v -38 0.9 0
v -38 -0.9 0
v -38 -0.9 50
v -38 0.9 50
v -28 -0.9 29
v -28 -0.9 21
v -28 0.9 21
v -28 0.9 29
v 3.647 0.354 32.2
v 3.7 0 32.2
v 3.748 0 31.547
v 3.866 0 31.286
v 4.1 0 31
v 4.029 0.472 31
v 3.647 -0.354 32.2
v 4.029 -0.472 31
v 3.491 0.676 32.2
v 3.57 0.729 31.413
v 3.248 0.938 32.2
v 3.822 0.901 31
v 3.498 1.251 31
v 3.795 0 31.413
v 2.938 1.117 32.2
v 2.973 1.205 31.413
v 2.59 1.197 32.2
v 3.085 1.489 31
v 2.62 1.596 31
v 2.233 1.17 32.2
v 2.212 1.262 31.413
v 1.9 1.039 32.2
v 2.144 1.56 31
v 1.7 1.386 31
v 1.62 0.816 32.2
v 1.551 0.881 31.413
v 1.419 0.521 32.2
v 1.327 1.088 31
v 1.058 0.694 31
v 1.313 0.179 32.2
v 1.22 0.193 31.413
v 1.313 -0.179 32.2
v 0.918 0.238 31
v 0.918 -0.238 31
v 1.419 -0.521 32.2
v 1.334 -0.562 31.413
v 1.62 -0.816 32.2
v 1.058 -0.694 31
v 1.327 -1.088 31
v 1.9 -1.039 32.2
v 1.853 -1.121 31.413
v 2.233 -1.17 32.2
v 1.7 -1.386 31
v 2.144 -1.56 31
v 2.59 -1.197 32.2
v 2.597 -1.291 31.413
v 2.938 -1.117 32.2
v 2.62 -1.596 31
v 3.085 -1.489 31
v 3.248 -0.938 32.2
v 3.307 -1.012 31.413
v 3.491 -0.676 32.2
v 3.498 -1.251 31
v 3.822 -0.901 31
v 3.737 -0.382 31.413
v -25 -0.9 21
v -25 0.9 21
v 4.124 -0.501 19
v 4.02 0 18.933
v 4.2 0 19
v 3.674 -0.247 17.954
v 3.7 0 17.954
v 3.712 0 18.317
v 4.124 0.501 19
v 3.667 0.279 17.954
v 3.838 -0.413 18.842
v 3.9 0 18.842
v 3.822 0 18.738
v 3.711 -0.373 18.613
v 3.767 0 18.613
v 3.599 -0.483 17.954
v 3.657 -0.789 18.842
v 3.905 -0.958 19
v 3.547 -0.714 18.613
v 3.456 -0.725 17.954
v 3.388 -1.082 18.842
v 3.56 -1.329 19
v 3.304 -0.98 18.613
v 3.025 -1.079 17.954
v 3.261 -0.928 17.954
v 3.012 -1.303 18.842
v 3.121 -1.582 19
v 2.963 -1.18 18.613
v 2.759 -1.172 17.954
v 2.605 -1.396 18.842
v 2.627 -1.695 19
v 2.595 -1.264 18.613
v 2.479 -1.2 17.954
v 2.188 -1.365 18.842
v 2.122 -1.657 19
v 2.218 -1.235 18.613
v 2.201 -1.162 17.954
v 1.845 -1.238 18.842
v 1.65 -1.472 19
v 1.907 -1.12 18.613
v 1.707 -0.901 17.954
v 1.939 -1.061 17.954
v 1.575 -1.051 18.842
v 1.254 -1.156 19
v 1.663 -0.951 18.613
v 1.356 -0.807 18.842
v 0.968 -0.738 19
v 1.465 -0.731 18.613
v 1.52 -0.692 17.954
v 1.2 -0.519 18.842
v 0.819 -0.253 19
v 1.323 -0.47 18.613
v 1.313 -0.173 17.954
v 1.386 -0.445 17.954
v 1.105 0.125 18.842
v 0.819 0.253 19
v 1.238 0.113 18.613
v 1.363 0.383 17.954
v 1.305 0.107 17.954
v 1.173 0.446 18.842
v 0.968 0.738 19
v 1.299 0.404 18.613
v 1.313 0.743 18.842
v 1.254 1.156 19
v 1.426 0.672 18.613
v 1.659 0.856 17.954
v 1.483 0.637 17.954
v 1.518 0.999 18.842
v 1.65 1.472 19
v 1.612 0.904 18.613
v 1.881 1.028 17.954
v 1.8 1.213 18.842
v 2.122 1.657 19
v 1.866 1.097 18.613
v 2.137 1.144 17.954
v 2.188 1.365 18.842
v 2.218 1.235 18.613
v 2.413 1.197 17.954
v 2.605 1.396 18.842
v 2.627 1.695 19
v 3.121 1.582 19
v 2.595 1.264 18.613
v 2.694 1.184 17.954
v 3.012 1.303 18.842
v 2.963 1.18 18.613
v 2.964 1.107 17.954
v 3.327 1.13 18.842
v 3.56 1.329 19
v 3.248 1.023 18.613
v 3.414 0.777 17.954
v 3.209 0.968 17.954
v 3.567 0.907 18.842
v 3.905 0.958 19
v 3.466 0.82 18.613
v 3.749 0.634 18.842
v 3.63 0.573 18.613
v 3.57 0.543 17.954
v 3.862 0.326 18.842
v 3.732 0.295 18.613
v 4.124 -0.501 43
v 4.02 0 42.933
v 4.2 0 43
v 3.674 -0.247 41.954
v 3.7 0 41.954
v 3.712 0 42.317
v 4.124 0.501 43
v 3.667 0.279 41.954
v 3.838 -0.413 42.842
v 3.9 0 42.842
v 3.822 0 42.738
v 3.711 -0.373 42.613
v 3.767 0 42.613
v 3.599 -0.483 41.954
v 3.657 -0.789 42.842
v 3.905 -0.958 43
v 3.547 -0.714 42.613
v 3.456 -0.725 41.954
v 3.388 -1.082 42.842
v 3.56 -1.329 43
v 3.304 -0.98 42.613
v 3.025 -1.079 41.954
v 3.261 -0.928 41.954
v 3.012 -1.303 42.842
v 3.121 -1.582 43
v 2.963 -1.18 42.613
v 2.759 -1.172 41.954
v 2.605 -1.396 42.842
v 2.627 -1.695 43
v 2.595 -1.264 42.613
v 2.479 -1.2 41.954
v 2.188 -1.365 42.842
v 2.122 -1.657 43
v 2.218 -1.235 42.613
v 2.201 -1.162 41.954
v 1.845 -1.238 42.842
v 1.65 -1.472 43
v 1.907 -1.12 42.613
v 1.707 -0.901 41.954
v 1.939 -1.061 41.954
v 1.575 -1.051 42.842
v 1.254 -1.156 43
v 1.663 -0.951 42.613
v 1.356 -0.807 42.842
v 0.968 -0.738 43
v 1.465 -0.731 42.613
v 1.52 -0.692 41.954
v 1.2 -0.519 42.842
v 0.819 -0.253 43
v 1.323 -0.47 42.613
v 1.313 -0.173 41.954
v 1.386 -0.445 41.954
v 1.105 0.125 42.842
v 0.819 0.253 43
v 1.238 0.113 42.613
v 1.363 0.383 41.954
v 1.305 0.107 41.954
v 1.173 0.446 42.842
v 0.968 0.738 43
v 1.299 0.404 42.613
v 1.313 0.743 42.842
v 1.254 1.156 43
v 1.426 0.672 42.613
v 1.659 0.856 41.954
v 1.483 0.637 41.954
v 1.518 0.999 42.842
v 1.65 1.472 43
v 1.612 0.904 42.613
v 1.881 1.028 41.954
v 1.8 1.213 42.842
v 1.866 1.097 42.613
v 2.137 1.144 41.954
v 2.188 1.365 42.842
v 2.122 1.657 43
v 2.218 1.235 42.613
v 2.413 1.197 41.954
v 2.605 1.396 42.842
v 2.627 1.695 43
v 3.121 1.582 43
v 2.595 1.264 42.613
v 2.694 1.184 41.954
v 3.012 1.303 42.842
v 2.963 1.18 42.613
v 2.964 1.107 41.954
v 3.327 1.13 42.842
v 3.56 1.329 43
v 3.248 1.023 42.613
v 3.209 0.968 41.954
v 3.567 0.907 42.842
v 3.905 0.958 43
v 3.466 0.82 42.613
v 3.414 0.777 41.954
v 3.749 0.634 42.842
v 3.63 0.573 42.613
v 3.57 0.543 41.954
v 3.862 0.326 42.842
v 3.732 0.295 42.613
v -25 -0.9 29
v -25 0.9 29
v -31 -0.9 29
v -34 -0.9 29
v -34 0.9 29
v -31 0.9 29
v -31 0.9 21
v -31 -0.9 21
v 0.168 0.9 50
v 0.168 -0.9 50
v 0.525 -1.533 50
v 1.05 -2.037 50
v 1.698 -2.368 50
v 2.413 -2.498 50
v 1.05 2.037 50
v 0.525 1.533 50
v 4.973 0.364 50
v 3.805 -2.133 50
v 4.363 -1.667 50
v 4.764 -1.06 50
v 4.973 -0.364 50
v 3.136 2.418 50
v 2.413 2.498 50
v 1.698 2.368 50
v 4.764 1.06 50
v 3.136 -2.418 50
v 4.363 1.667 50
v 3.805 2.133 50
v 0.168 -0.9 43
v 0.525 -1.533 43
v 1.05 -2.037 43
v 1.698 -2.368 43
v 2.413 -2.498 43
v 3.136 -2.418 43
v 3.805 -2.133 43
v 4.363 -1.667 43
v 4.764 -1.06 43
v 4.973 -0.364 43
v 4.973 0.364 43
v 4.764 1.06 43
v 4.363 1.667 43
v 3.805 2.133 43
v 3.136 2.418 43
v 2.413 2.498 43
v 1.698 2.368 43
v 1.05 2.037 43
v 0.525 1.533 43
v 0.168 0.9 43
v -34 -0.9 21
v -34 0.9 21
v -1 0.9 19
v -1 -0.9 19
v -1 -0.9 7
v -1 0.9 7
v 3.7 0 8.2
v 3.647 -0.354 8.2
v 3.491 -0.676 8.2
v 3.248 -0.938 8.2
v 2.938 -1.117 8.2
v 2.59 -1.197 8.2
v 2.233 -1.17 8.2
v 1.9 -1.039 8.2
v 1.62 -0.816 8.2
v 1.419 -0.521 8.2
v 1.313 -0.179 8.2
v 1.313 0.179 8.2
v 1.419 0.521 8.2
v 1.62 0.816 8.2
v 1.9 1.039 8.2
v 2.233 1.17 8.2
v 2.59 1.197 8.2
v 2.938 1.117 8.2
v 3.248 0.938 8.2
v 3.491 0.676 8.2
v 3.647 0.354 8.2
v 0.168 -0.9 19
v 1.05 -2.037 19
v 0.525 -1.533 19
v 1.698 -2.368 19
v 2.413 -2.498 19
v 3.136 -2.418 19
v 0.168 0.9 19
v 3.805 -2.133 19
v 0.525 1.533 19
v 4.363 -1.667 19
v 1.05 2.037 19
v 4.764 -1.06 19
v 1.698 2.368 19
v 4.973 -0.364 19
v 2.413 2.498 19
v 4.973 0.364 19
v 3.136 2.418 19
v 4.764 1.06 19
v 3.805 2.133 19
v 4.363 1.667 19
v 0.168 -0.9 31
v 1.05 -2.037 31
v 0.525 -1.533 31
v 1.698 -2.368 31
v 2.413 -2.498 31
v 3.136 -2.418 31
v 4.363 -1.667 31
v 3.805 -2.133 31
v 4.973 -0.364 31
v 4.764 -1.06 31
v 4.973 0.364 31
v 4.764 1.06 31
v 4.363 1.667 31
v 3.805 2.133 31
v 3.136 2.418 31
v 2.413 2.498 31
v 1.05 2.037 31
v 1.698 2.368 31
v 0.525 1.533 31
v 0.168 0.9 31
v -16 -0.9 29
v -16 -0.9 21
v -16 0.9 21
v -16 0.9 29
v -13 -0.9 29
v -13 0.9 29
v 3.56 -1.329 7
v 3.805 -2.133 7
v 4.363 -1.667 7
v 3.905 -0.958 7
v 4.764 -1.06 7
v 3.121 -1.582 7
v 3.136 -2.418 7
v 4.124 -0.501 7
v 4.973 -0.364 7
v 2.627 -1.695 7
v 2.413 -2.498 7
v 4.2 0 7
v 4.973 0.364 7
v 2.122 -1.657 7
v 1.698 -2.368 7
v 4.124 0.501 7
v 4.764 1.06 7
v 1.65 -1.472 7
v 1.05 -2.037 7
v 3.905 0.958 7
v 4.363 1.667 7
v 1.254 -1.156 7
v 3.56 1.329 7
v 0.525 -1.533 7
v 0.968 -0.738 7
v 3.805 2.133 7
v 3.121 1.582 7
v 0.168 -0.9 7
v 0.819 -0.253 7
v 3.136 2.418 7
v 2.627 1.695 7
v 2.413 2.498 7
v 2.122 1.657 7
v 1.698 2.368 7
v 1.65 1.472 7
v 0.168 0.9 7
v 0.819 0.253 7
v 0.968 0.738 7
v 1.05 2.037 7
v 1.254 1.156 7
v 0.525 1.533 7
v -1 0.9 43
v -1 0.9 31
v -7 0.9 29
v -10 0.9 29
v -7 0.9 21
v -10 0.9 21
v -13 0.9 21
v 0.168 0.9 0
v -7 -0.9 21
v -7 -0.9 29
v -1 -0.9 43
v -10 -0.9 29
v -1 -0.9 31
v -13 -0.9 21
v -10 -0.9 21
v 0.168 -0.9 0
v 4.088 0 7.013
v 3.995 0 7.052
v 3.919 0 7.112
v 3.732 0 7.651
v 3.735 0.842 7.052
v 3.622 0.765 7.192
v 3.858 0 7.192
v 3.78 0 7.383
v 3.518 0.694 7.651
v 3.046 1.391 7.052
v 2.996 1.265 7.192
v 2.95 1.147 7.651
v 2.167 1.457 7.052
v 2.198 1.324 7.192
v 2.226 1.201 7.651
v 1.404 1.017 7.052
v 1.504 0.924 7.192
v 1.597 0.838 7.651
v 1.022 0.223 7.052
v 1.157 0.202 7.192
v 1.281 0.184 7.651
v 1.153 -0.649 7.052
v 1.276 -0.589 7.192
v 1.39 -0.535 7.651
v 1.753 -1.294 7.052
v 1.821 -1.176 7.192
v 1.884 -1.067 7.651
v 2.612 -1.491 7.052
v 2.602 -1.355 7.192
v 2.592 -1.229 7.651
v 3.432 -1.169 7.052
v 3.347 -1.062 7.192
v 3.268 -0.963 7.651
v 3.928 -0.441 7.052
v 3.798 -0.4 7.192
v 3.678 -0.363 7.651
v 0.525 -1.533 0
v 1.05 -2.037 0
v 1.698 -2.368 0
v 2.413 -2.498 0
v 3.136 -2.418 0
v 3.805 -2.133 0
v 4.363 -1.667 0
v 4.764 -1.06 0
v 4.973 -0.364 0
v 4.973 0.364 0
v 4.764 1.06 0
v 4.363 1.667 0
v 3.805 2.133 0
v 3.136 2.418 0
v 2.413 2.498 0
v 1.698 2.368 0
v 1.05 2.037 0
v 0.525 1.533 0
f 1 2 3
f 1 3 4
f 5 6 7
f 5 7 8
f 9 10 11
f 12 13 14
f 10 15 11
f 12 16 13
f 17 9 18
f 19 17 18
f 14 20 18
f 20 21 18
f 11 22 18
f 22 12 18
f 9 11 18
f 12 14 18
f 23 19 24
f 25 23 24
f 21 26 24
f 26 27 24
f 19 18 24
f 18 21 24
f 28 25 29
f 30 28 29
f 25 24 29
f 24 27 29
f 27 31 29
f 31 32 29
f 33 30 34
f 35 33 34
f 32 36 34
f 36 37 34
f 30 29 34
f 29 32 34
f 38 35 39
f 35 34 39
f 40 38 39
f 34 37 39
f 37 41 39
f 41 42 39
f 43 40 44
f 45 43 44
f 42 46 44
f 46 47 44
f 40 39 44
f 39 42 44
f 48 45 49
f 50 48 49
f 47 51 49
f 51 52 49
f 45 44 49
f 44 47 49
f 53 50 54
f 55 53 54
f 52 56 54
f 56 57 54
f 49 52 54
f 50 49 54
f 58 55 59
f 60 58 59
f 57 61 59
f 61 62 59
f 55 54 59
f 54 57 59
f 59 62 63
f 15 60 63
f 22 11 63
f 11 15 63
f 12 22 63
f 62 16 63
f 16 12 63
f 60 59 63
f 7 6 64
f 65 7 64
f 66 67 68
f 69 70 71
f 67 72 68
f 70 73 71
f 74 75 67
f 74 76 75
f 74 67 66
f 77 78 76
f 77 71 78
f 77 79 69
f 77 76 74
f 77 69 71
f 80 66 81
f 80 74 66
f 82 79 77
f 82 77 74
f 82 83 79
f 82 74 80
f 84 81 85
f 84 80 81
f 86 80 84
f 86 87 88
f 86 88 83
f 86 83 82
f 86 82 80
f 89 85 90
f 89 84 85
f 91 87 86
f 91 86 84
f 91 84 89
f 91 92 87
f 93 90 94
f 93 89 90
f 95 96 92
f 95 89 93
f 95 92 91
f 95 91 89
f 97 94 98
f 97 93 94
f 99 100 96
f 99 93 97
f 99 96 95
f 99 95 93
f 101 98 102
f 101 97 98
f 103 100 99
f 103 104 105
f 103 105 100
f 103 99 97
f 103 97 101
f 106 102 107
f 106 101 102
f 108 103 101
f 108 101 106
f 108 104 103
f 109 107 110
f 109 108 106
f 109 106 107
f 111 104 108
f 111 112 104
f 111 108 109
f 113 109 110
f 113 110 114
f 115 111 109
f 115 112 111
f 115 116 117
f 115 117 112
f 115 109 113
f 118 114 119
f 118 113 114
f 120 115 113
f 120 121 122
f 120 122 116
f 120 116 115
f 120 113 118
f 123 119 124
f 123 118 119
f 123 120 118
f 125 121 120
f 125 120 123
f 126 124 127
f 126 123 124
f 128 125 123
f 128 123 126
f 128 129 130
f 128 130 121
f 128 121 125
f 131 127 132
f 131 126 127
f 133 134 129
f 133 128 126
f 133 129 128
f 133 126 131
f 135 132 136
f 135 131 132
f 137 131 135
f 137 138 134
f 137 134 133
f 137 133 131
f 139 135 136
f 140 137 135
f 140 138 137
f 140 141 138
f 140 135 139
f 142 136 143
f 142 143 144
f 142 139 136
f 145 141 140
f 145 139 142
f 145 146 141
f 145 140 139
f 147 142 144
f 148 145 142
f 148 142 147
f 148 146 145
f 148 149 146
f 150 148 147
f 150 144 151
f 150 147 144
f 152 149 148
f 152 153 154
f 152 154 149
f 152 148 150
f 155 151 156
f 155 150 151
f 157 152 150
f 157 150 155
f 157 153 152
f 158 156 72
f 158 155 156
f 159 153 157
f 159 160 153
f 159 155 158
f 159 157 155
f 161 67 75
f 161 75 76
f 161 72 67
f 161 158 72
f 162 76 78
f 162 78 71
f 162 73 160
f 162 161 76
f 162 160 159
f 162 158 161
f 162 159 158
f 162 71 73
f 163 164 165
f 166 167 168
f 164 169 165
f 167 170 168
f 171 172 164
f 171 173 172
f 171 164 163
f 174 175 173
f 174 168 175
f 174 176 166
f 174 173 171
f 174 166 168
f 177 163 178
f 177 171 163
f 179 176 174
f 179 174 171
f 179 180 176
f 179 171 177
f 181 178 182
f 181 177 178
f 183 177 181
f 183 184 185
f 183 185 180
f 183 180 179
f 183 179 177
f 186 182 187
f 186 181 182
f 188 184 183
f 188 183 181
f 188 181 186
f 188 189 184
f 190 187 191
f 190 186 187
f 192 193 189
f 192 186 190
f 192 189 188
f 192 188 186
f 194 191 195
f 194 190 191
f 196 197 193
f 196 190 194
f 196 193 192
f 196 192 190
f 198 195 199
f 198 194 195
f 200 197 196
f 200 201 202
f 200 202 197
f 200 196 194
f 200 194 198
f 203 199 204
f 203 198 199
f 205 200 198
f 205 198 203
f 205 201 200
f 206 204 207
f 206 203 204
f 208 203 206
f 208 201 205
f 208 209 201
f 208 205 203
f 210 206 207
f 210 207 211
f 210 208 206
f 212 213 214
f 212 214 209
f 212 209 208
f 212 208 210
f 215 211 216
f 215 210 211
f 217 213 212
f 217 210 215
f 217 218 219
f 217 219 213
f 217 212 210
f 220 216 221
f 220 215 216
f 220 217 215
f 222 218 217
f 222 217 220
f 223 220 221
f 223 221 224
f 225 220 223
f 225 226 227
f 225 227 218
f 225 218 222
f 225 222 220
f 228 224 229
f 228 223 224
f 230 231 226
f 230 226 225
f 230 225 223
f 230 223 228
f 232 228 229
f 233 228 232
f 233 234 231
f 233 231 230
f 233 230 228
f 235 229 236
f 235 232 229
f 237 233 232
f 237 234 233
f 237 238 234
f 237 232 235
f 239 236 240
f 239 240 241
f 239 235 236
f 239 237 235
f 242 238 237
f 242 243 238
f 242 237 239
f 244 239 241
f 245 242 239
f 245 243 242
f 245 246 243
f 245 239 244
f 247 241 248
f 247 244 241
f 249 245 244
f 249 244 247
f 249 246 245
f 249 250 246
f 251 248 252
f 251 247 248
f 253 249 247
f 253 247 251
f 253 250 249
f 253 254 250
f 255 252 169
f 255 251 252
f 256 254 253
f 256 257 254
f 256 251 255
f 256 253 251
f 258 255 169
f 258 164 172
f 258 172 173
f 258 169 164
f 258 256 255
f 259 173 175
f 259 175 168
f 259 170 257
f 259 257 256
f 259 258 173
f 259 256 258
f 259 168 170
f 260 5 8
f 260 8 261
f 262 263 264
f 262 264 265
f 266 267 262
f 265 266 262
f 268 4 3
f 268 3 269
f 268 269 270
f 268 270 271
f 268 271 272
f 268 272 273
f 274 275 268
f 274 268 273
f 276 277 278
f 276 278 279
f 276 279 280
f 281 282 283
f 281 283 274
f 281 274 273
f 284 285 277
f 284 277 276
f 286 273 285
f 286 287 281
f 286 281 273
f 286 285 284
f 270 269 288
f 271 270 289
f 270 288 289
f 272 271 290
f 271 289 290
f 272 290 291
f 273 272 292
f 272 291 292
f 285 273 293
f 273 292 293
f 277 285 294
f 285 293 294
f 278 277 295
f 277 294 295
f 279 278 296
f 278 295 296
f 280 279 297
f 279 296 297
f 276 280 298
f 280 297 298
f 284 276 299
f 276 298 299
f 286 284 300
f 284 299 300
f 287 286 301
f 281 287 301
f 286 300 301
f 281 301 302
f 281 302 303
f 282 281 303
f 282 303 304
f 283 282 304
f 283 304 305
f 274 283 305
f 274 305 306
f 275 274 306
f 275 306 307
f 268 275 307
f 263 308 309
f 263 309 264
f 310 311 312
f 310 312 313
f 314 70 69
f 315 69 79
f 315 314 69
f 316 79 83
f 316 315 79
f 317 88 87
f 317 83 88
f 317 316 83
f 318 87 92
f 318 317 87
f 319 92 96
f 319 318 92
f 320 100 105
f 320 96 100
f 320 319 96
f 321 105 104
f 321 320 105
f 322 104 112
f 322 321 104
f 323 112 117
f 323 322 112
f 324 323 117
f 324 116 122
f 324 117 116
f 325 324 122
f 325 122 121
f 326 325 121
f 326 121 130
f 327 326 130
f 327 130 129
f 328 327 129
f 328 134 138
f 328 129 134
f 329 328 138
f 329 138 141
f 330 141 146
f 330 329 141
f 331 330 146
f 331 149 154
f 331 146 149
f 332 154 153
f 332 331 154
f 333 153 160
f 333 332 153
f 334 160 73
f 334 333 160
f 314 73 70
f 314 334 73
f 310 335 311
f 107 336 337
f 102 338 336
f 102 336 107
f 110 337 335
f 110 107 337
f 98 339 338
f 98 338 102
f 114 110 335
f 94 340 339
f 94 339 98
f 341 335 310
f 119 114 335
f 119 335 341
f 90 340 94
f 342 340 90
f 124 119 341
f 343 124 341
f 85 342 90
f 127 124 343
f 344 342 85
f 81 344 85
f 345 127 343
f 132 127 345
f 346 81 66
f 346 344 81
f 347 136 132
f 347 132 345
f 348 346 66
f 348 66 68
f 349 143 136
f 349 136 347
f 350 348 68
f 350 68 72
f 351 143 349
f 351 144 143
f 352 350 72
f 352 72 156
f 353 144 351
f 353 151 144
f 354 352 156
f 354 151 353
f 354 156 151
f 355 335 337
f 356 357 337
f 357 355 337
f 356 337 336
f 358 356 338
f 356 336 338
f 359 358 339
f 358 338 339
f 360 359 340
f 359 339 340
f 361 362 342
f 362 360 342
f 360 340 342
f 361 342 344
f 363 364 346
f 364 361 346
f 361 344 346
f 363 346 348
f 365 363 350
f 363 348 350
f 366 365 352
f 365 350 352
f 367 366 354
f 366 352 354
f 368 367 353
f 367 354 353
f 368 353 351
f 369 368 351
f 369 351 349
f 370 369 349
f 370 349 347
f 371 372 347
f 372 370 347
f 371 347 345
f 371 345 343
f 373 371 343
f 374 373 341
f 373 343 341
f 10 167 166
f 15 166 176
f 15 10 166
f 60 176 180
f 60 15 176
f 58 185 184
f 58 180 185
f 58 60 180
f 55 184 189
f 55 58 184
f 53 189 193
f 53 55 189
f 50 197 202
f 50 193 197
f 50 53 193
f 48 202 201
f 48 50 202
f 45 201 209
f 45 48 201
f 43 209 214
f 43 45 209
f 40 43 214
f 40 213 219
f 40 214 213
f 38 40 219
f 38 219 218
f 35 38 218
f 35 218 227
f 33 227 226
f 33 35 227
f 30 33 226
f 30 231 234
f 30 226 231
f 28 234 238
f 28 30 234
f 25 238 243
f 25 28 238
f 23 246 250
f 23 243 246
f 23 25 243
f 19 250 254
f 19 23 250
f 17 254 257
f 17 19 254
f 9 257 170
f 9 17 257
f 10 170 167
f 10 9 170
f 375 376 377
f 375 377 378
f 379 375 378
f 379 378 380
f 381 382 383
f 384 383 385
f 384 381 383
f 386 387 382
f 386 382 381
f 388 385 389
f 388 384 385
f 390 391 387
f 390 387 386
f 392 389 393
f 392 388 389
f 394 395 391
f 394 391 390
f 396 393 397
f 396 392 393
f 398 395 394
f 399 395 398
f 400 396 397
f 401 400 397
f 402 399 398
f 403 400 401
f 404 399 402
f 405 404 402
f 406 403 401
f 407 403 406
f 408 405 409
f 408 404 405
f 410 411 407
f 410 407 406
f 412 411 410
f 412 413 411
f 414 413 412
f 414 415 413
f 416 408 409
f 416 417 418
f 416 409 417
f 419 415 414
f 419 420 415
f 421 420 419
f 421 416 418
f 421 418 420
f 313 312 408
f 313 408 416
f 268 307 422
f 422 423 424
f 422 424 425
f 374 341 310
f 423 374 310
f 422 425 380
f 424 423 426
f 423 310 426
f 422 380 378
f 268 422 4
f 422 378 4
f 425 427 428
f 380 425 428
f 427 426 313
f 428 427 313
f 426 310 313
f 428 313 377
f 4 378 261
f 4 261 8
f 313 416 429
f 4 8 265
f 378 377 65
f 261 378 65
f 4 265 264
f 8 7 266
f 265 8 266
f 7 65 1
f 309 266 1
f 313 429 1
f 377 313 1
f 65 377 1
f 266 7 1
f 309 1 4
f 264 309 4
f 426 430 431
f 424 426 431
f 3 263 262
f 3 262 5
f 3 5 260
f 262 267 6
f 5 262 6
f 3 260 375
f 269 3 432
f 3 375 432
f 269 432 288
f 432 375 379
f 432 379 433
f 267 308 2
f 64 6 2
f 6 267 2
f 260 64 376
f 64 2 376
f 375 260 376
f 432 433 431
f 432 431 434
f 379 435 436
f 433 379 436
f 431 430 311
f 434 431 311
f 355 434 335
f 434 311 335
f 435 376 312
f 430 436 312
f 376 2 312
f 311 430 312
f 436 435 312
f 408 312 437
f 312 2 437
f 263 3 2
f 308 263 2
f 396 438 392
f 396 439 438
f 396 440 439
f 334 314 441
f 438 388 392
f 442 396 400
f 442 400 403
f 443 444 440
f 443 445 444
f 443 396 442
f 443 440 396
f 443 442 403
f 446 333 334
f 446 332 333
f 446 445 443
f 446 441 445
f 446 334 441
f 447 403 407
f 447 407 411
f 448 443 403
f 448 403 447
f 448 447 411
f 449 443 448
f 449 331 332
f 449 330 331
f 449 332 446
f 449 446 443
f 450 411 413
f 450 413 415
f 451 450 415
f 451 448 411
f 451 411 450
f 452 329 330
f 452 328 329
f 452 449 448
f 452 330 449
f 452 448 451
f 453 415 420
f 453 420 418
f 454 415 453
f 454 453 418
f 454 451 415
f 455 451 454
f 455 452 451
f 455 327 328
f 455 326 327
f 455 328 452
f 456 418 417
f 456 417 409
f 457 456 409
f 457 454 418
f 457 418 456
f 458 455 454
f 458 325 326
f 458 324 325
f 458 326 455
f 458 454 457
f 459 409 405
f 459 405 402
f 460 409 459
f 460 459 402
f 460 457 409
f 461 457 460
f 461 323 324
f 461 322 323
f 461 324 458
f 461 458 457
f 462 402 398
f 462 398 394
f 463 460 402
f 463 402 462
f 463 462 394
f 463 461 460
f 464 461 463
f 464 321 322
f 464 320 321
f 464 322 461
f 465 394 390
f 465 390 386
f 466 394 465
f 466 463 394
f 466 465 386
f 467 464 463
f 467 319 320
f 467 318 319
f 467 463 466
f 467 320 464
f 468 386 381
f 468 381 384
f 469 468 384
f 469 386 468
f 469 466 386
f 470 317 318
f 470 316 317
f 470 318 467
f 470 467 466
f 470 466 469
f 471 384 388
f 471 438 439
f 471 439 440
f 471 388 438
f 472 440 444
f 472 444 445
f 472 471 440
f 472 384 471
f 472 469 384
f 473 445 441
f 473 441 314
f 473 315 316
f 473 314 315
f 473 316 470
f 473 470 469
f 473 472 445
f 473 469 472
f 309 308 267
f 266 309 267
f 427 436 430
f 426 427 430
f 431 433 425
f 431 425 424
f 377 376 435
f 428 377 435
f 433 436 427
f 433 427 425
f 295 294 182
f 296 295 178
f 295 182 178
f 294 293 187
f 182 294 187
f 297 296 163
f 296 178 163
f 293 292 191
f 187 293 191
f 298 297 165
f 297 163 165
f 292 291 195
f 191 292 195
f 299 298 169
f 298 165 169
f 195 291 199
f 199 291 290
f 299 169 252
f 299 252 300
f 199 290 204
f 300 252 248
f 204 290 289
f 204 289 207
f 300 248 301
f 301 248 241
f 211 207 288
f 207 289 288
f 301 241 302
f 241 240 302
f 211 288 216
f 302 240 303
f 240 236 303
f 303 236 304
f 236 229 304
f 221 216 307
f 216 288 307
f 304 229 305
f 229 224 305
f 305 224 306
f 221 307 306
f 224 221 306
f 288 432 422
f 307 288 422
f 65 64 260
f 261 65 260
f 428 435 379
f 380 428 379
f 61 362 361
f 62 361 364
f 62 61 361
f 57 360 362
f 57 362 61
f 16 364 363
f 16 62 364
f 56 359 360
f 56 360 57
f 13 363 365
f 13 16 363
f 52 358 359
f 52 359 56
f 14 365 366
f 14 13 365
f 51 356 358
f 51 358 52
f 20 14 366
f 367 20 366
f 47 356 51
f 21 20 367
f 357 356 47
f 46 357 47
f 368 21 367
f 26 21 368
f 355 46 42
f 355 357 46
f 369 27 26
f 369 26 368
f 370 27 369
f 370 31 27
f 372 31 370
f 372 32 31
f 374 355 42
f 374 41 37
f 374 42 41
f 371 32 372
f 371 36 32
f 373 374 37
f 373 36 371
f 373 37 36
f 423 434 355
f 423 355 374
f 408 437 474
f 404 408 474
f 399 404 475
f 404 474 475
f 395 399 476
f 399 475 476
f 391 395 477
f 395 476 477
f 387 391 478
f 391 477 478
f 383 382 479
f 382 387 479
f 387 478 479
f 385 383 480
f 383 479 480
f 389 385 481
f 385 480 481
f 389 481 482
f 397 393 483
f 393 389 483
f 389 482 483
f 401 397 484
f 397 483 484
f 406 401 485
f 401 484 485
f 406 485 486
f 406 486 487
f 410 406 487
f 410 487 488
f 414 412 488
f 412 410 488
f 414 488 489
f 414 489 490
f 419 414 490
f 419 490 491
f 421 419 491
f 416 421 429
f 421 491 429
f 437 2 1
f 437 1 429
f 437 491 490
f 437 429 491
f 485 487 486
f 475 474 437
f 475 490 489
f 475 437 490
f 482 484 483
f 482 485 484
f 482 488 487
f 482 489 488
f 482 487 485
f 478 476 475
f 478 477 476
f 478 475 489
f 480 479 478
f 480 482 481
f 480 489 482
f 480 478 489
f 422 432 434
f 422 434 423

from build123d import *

# Parameters (mm, degrees)
F0_W      = 38
F0_H      = 1.8
F1_DEPTH  = 50
F2_W      = 33.097349
F2_H      = 12
F2_W_2    = 36.357001
F3_DEPTH  = 25
F5_W      = 3
F5_H      = 8
F6_DEPTH  = 1.8
F10_R     = 1.2
F11_DEPTH = 43
F4_W      = 33.097349
F4_H      = 12
F4_W_2    = 36.357002
F14_DEPTH = 1


with BuildPart() as f1:
    # F0 (on Top) → F1 (new body)
    with BuildSketch(Plane.XY):
        with Locations((-19, 0)):
            Rectangle(F0_W, F0_H)
        with BuildLine():
            Line((0.167619, 0.9), (0, 0.9))
            Line((0, 0.9), (0, -0.9))
            Line((0, -0.9), (0.167619, -0.9))
            ThreePointArc((0.167619, -0.9), (5, 0), (0.167619, 0.9))
        make_face()
    extrude(amount=F1_DEPTH)

    # F2 (on Right) → F3 (cut)
    with BuildSketch(Plane.YZ):
        with Locations((2.793991, 37)):
            Rectangle(F2_W, F2_H)
        with Locations((3.725327, 13)):
            Rectangle(F2_W_2, F2_H)
    extrude(amount=F3_DEPTH, mode=Mode.SUBTRACT)

    # F5 (on face) → F6 (cut, through all)
    with BuildSketch(Plane.XZ.offset(0.9)):
        with Locations((-32.5, 25)):
            Rectangle(F5_W, F5_H)
        with Locations((-26.5, 25)):
            Rectangle(F5_W, F5_H)
        with Locations((-14.5, 25)):
            Rectangle(F5_W, F5_H)
        with Locations((-8.5, 25)):
            Rectangle(F5_W, F5_H)
    extrude(amount=-F6_DEPTH, mode=Mode.SUBTRACT)

    # F8 (on Front) → F9 (revolve)
    with BuildSketch(Plane.XZ):
        with BuildLine():
            add(Edge.make_bspline(
                [(3.7, 32.2), (3.704607, 31.503535), (3.733649, 31.405747), (4.1, 31)],
                knots=[0, 0, 0, 0, 1.264911, 1.264911, 1.264911, 1.264911], degree=3))
            Line((3.7, 32.2), (2.5, 32.2))
            Line((2.5, 32.2), (2.5, 31))
            Line((2.5, 31), (4.1, 31))
        make_face()
        with BuildLine():
            Line((2.5, 8.2), (2.5, 7))
            Line((2.5, 7), (4.2, 7))
            add(Edge.make_bspline(
                [(4.2, 7), (3.710281, 7), (3.725807, 7.664207), (3.7, 8.2)],
                knots=[0, 0, 0, 0, 1.3, 1.3, 1.3, 1.3], degree=3))
            Line((3.7, 8.2), (2.5, 8.2))
        make_face()
    revolve(axis=Axis((2.5, 0, 31.6), (0, 0, 1)))

    # F10 (on face) → F11 (join, through all)
    with BuildSketch(Plane(origin=(0, 0, 0), x_dir=(1, 0, 0), z_dir=(0, 0, -1))):
        with Locations((2.5, 0)):
            Circle(F10_R)
    extrude(amount=-F11_DEPTH)

    # F12 (on Front) → F13 (revolve)
    with BuildSketch(Plane.XZ):
        with BuildLine():
            Line((4.2, 43), (2.5, 43))
            Line((2.5, 43), (2.5, 41.8))
            Line((2.5, 41.8), (3.7, 41.8))
            add(Edge.make_bspline(
                [(4.2, 43), (3.697237, 42.880607), (3.698886, 42.436921), (3.7, 41.8)],
                knots=[0, 0, 0, 0, 1.3, 1.3, 1.3, 1.3], degree=3))
        make_face()
        with BuildLine():
            Line((4.2, 19), (2.5, 19))
            Line((2.5, 19), (2.5, 17.8))
            Line((2.5, 17.8), (3.7, 17.8))
            add(Edge.make_bspline(
                [(4.2, 19), (3.697237, 18.880607), (3.698886, 18.436921), (3.7, 17.8)],
                knots=[0, 0, 0, 0, 1.3, 1.3, 1.3, 1.3], degree=3))
        make_face()
    revolve(axis=Axis((2.5, 0, 42.4), (0, 0, -1)))

    # F4 (on Right) → F14 (cut)
    with BuildSketch(Plane.YZ):
        with Locations((-0.465668, 37)):
            Rectangle(F4_W, F4_H)
        with Locations((0.465667, 13)):
            Rectangle(F4_W_2, F4_H)
    extrude(amount=-F14_DEPTH, mode=Mode.SUBTRACT)


solid = f1.part
